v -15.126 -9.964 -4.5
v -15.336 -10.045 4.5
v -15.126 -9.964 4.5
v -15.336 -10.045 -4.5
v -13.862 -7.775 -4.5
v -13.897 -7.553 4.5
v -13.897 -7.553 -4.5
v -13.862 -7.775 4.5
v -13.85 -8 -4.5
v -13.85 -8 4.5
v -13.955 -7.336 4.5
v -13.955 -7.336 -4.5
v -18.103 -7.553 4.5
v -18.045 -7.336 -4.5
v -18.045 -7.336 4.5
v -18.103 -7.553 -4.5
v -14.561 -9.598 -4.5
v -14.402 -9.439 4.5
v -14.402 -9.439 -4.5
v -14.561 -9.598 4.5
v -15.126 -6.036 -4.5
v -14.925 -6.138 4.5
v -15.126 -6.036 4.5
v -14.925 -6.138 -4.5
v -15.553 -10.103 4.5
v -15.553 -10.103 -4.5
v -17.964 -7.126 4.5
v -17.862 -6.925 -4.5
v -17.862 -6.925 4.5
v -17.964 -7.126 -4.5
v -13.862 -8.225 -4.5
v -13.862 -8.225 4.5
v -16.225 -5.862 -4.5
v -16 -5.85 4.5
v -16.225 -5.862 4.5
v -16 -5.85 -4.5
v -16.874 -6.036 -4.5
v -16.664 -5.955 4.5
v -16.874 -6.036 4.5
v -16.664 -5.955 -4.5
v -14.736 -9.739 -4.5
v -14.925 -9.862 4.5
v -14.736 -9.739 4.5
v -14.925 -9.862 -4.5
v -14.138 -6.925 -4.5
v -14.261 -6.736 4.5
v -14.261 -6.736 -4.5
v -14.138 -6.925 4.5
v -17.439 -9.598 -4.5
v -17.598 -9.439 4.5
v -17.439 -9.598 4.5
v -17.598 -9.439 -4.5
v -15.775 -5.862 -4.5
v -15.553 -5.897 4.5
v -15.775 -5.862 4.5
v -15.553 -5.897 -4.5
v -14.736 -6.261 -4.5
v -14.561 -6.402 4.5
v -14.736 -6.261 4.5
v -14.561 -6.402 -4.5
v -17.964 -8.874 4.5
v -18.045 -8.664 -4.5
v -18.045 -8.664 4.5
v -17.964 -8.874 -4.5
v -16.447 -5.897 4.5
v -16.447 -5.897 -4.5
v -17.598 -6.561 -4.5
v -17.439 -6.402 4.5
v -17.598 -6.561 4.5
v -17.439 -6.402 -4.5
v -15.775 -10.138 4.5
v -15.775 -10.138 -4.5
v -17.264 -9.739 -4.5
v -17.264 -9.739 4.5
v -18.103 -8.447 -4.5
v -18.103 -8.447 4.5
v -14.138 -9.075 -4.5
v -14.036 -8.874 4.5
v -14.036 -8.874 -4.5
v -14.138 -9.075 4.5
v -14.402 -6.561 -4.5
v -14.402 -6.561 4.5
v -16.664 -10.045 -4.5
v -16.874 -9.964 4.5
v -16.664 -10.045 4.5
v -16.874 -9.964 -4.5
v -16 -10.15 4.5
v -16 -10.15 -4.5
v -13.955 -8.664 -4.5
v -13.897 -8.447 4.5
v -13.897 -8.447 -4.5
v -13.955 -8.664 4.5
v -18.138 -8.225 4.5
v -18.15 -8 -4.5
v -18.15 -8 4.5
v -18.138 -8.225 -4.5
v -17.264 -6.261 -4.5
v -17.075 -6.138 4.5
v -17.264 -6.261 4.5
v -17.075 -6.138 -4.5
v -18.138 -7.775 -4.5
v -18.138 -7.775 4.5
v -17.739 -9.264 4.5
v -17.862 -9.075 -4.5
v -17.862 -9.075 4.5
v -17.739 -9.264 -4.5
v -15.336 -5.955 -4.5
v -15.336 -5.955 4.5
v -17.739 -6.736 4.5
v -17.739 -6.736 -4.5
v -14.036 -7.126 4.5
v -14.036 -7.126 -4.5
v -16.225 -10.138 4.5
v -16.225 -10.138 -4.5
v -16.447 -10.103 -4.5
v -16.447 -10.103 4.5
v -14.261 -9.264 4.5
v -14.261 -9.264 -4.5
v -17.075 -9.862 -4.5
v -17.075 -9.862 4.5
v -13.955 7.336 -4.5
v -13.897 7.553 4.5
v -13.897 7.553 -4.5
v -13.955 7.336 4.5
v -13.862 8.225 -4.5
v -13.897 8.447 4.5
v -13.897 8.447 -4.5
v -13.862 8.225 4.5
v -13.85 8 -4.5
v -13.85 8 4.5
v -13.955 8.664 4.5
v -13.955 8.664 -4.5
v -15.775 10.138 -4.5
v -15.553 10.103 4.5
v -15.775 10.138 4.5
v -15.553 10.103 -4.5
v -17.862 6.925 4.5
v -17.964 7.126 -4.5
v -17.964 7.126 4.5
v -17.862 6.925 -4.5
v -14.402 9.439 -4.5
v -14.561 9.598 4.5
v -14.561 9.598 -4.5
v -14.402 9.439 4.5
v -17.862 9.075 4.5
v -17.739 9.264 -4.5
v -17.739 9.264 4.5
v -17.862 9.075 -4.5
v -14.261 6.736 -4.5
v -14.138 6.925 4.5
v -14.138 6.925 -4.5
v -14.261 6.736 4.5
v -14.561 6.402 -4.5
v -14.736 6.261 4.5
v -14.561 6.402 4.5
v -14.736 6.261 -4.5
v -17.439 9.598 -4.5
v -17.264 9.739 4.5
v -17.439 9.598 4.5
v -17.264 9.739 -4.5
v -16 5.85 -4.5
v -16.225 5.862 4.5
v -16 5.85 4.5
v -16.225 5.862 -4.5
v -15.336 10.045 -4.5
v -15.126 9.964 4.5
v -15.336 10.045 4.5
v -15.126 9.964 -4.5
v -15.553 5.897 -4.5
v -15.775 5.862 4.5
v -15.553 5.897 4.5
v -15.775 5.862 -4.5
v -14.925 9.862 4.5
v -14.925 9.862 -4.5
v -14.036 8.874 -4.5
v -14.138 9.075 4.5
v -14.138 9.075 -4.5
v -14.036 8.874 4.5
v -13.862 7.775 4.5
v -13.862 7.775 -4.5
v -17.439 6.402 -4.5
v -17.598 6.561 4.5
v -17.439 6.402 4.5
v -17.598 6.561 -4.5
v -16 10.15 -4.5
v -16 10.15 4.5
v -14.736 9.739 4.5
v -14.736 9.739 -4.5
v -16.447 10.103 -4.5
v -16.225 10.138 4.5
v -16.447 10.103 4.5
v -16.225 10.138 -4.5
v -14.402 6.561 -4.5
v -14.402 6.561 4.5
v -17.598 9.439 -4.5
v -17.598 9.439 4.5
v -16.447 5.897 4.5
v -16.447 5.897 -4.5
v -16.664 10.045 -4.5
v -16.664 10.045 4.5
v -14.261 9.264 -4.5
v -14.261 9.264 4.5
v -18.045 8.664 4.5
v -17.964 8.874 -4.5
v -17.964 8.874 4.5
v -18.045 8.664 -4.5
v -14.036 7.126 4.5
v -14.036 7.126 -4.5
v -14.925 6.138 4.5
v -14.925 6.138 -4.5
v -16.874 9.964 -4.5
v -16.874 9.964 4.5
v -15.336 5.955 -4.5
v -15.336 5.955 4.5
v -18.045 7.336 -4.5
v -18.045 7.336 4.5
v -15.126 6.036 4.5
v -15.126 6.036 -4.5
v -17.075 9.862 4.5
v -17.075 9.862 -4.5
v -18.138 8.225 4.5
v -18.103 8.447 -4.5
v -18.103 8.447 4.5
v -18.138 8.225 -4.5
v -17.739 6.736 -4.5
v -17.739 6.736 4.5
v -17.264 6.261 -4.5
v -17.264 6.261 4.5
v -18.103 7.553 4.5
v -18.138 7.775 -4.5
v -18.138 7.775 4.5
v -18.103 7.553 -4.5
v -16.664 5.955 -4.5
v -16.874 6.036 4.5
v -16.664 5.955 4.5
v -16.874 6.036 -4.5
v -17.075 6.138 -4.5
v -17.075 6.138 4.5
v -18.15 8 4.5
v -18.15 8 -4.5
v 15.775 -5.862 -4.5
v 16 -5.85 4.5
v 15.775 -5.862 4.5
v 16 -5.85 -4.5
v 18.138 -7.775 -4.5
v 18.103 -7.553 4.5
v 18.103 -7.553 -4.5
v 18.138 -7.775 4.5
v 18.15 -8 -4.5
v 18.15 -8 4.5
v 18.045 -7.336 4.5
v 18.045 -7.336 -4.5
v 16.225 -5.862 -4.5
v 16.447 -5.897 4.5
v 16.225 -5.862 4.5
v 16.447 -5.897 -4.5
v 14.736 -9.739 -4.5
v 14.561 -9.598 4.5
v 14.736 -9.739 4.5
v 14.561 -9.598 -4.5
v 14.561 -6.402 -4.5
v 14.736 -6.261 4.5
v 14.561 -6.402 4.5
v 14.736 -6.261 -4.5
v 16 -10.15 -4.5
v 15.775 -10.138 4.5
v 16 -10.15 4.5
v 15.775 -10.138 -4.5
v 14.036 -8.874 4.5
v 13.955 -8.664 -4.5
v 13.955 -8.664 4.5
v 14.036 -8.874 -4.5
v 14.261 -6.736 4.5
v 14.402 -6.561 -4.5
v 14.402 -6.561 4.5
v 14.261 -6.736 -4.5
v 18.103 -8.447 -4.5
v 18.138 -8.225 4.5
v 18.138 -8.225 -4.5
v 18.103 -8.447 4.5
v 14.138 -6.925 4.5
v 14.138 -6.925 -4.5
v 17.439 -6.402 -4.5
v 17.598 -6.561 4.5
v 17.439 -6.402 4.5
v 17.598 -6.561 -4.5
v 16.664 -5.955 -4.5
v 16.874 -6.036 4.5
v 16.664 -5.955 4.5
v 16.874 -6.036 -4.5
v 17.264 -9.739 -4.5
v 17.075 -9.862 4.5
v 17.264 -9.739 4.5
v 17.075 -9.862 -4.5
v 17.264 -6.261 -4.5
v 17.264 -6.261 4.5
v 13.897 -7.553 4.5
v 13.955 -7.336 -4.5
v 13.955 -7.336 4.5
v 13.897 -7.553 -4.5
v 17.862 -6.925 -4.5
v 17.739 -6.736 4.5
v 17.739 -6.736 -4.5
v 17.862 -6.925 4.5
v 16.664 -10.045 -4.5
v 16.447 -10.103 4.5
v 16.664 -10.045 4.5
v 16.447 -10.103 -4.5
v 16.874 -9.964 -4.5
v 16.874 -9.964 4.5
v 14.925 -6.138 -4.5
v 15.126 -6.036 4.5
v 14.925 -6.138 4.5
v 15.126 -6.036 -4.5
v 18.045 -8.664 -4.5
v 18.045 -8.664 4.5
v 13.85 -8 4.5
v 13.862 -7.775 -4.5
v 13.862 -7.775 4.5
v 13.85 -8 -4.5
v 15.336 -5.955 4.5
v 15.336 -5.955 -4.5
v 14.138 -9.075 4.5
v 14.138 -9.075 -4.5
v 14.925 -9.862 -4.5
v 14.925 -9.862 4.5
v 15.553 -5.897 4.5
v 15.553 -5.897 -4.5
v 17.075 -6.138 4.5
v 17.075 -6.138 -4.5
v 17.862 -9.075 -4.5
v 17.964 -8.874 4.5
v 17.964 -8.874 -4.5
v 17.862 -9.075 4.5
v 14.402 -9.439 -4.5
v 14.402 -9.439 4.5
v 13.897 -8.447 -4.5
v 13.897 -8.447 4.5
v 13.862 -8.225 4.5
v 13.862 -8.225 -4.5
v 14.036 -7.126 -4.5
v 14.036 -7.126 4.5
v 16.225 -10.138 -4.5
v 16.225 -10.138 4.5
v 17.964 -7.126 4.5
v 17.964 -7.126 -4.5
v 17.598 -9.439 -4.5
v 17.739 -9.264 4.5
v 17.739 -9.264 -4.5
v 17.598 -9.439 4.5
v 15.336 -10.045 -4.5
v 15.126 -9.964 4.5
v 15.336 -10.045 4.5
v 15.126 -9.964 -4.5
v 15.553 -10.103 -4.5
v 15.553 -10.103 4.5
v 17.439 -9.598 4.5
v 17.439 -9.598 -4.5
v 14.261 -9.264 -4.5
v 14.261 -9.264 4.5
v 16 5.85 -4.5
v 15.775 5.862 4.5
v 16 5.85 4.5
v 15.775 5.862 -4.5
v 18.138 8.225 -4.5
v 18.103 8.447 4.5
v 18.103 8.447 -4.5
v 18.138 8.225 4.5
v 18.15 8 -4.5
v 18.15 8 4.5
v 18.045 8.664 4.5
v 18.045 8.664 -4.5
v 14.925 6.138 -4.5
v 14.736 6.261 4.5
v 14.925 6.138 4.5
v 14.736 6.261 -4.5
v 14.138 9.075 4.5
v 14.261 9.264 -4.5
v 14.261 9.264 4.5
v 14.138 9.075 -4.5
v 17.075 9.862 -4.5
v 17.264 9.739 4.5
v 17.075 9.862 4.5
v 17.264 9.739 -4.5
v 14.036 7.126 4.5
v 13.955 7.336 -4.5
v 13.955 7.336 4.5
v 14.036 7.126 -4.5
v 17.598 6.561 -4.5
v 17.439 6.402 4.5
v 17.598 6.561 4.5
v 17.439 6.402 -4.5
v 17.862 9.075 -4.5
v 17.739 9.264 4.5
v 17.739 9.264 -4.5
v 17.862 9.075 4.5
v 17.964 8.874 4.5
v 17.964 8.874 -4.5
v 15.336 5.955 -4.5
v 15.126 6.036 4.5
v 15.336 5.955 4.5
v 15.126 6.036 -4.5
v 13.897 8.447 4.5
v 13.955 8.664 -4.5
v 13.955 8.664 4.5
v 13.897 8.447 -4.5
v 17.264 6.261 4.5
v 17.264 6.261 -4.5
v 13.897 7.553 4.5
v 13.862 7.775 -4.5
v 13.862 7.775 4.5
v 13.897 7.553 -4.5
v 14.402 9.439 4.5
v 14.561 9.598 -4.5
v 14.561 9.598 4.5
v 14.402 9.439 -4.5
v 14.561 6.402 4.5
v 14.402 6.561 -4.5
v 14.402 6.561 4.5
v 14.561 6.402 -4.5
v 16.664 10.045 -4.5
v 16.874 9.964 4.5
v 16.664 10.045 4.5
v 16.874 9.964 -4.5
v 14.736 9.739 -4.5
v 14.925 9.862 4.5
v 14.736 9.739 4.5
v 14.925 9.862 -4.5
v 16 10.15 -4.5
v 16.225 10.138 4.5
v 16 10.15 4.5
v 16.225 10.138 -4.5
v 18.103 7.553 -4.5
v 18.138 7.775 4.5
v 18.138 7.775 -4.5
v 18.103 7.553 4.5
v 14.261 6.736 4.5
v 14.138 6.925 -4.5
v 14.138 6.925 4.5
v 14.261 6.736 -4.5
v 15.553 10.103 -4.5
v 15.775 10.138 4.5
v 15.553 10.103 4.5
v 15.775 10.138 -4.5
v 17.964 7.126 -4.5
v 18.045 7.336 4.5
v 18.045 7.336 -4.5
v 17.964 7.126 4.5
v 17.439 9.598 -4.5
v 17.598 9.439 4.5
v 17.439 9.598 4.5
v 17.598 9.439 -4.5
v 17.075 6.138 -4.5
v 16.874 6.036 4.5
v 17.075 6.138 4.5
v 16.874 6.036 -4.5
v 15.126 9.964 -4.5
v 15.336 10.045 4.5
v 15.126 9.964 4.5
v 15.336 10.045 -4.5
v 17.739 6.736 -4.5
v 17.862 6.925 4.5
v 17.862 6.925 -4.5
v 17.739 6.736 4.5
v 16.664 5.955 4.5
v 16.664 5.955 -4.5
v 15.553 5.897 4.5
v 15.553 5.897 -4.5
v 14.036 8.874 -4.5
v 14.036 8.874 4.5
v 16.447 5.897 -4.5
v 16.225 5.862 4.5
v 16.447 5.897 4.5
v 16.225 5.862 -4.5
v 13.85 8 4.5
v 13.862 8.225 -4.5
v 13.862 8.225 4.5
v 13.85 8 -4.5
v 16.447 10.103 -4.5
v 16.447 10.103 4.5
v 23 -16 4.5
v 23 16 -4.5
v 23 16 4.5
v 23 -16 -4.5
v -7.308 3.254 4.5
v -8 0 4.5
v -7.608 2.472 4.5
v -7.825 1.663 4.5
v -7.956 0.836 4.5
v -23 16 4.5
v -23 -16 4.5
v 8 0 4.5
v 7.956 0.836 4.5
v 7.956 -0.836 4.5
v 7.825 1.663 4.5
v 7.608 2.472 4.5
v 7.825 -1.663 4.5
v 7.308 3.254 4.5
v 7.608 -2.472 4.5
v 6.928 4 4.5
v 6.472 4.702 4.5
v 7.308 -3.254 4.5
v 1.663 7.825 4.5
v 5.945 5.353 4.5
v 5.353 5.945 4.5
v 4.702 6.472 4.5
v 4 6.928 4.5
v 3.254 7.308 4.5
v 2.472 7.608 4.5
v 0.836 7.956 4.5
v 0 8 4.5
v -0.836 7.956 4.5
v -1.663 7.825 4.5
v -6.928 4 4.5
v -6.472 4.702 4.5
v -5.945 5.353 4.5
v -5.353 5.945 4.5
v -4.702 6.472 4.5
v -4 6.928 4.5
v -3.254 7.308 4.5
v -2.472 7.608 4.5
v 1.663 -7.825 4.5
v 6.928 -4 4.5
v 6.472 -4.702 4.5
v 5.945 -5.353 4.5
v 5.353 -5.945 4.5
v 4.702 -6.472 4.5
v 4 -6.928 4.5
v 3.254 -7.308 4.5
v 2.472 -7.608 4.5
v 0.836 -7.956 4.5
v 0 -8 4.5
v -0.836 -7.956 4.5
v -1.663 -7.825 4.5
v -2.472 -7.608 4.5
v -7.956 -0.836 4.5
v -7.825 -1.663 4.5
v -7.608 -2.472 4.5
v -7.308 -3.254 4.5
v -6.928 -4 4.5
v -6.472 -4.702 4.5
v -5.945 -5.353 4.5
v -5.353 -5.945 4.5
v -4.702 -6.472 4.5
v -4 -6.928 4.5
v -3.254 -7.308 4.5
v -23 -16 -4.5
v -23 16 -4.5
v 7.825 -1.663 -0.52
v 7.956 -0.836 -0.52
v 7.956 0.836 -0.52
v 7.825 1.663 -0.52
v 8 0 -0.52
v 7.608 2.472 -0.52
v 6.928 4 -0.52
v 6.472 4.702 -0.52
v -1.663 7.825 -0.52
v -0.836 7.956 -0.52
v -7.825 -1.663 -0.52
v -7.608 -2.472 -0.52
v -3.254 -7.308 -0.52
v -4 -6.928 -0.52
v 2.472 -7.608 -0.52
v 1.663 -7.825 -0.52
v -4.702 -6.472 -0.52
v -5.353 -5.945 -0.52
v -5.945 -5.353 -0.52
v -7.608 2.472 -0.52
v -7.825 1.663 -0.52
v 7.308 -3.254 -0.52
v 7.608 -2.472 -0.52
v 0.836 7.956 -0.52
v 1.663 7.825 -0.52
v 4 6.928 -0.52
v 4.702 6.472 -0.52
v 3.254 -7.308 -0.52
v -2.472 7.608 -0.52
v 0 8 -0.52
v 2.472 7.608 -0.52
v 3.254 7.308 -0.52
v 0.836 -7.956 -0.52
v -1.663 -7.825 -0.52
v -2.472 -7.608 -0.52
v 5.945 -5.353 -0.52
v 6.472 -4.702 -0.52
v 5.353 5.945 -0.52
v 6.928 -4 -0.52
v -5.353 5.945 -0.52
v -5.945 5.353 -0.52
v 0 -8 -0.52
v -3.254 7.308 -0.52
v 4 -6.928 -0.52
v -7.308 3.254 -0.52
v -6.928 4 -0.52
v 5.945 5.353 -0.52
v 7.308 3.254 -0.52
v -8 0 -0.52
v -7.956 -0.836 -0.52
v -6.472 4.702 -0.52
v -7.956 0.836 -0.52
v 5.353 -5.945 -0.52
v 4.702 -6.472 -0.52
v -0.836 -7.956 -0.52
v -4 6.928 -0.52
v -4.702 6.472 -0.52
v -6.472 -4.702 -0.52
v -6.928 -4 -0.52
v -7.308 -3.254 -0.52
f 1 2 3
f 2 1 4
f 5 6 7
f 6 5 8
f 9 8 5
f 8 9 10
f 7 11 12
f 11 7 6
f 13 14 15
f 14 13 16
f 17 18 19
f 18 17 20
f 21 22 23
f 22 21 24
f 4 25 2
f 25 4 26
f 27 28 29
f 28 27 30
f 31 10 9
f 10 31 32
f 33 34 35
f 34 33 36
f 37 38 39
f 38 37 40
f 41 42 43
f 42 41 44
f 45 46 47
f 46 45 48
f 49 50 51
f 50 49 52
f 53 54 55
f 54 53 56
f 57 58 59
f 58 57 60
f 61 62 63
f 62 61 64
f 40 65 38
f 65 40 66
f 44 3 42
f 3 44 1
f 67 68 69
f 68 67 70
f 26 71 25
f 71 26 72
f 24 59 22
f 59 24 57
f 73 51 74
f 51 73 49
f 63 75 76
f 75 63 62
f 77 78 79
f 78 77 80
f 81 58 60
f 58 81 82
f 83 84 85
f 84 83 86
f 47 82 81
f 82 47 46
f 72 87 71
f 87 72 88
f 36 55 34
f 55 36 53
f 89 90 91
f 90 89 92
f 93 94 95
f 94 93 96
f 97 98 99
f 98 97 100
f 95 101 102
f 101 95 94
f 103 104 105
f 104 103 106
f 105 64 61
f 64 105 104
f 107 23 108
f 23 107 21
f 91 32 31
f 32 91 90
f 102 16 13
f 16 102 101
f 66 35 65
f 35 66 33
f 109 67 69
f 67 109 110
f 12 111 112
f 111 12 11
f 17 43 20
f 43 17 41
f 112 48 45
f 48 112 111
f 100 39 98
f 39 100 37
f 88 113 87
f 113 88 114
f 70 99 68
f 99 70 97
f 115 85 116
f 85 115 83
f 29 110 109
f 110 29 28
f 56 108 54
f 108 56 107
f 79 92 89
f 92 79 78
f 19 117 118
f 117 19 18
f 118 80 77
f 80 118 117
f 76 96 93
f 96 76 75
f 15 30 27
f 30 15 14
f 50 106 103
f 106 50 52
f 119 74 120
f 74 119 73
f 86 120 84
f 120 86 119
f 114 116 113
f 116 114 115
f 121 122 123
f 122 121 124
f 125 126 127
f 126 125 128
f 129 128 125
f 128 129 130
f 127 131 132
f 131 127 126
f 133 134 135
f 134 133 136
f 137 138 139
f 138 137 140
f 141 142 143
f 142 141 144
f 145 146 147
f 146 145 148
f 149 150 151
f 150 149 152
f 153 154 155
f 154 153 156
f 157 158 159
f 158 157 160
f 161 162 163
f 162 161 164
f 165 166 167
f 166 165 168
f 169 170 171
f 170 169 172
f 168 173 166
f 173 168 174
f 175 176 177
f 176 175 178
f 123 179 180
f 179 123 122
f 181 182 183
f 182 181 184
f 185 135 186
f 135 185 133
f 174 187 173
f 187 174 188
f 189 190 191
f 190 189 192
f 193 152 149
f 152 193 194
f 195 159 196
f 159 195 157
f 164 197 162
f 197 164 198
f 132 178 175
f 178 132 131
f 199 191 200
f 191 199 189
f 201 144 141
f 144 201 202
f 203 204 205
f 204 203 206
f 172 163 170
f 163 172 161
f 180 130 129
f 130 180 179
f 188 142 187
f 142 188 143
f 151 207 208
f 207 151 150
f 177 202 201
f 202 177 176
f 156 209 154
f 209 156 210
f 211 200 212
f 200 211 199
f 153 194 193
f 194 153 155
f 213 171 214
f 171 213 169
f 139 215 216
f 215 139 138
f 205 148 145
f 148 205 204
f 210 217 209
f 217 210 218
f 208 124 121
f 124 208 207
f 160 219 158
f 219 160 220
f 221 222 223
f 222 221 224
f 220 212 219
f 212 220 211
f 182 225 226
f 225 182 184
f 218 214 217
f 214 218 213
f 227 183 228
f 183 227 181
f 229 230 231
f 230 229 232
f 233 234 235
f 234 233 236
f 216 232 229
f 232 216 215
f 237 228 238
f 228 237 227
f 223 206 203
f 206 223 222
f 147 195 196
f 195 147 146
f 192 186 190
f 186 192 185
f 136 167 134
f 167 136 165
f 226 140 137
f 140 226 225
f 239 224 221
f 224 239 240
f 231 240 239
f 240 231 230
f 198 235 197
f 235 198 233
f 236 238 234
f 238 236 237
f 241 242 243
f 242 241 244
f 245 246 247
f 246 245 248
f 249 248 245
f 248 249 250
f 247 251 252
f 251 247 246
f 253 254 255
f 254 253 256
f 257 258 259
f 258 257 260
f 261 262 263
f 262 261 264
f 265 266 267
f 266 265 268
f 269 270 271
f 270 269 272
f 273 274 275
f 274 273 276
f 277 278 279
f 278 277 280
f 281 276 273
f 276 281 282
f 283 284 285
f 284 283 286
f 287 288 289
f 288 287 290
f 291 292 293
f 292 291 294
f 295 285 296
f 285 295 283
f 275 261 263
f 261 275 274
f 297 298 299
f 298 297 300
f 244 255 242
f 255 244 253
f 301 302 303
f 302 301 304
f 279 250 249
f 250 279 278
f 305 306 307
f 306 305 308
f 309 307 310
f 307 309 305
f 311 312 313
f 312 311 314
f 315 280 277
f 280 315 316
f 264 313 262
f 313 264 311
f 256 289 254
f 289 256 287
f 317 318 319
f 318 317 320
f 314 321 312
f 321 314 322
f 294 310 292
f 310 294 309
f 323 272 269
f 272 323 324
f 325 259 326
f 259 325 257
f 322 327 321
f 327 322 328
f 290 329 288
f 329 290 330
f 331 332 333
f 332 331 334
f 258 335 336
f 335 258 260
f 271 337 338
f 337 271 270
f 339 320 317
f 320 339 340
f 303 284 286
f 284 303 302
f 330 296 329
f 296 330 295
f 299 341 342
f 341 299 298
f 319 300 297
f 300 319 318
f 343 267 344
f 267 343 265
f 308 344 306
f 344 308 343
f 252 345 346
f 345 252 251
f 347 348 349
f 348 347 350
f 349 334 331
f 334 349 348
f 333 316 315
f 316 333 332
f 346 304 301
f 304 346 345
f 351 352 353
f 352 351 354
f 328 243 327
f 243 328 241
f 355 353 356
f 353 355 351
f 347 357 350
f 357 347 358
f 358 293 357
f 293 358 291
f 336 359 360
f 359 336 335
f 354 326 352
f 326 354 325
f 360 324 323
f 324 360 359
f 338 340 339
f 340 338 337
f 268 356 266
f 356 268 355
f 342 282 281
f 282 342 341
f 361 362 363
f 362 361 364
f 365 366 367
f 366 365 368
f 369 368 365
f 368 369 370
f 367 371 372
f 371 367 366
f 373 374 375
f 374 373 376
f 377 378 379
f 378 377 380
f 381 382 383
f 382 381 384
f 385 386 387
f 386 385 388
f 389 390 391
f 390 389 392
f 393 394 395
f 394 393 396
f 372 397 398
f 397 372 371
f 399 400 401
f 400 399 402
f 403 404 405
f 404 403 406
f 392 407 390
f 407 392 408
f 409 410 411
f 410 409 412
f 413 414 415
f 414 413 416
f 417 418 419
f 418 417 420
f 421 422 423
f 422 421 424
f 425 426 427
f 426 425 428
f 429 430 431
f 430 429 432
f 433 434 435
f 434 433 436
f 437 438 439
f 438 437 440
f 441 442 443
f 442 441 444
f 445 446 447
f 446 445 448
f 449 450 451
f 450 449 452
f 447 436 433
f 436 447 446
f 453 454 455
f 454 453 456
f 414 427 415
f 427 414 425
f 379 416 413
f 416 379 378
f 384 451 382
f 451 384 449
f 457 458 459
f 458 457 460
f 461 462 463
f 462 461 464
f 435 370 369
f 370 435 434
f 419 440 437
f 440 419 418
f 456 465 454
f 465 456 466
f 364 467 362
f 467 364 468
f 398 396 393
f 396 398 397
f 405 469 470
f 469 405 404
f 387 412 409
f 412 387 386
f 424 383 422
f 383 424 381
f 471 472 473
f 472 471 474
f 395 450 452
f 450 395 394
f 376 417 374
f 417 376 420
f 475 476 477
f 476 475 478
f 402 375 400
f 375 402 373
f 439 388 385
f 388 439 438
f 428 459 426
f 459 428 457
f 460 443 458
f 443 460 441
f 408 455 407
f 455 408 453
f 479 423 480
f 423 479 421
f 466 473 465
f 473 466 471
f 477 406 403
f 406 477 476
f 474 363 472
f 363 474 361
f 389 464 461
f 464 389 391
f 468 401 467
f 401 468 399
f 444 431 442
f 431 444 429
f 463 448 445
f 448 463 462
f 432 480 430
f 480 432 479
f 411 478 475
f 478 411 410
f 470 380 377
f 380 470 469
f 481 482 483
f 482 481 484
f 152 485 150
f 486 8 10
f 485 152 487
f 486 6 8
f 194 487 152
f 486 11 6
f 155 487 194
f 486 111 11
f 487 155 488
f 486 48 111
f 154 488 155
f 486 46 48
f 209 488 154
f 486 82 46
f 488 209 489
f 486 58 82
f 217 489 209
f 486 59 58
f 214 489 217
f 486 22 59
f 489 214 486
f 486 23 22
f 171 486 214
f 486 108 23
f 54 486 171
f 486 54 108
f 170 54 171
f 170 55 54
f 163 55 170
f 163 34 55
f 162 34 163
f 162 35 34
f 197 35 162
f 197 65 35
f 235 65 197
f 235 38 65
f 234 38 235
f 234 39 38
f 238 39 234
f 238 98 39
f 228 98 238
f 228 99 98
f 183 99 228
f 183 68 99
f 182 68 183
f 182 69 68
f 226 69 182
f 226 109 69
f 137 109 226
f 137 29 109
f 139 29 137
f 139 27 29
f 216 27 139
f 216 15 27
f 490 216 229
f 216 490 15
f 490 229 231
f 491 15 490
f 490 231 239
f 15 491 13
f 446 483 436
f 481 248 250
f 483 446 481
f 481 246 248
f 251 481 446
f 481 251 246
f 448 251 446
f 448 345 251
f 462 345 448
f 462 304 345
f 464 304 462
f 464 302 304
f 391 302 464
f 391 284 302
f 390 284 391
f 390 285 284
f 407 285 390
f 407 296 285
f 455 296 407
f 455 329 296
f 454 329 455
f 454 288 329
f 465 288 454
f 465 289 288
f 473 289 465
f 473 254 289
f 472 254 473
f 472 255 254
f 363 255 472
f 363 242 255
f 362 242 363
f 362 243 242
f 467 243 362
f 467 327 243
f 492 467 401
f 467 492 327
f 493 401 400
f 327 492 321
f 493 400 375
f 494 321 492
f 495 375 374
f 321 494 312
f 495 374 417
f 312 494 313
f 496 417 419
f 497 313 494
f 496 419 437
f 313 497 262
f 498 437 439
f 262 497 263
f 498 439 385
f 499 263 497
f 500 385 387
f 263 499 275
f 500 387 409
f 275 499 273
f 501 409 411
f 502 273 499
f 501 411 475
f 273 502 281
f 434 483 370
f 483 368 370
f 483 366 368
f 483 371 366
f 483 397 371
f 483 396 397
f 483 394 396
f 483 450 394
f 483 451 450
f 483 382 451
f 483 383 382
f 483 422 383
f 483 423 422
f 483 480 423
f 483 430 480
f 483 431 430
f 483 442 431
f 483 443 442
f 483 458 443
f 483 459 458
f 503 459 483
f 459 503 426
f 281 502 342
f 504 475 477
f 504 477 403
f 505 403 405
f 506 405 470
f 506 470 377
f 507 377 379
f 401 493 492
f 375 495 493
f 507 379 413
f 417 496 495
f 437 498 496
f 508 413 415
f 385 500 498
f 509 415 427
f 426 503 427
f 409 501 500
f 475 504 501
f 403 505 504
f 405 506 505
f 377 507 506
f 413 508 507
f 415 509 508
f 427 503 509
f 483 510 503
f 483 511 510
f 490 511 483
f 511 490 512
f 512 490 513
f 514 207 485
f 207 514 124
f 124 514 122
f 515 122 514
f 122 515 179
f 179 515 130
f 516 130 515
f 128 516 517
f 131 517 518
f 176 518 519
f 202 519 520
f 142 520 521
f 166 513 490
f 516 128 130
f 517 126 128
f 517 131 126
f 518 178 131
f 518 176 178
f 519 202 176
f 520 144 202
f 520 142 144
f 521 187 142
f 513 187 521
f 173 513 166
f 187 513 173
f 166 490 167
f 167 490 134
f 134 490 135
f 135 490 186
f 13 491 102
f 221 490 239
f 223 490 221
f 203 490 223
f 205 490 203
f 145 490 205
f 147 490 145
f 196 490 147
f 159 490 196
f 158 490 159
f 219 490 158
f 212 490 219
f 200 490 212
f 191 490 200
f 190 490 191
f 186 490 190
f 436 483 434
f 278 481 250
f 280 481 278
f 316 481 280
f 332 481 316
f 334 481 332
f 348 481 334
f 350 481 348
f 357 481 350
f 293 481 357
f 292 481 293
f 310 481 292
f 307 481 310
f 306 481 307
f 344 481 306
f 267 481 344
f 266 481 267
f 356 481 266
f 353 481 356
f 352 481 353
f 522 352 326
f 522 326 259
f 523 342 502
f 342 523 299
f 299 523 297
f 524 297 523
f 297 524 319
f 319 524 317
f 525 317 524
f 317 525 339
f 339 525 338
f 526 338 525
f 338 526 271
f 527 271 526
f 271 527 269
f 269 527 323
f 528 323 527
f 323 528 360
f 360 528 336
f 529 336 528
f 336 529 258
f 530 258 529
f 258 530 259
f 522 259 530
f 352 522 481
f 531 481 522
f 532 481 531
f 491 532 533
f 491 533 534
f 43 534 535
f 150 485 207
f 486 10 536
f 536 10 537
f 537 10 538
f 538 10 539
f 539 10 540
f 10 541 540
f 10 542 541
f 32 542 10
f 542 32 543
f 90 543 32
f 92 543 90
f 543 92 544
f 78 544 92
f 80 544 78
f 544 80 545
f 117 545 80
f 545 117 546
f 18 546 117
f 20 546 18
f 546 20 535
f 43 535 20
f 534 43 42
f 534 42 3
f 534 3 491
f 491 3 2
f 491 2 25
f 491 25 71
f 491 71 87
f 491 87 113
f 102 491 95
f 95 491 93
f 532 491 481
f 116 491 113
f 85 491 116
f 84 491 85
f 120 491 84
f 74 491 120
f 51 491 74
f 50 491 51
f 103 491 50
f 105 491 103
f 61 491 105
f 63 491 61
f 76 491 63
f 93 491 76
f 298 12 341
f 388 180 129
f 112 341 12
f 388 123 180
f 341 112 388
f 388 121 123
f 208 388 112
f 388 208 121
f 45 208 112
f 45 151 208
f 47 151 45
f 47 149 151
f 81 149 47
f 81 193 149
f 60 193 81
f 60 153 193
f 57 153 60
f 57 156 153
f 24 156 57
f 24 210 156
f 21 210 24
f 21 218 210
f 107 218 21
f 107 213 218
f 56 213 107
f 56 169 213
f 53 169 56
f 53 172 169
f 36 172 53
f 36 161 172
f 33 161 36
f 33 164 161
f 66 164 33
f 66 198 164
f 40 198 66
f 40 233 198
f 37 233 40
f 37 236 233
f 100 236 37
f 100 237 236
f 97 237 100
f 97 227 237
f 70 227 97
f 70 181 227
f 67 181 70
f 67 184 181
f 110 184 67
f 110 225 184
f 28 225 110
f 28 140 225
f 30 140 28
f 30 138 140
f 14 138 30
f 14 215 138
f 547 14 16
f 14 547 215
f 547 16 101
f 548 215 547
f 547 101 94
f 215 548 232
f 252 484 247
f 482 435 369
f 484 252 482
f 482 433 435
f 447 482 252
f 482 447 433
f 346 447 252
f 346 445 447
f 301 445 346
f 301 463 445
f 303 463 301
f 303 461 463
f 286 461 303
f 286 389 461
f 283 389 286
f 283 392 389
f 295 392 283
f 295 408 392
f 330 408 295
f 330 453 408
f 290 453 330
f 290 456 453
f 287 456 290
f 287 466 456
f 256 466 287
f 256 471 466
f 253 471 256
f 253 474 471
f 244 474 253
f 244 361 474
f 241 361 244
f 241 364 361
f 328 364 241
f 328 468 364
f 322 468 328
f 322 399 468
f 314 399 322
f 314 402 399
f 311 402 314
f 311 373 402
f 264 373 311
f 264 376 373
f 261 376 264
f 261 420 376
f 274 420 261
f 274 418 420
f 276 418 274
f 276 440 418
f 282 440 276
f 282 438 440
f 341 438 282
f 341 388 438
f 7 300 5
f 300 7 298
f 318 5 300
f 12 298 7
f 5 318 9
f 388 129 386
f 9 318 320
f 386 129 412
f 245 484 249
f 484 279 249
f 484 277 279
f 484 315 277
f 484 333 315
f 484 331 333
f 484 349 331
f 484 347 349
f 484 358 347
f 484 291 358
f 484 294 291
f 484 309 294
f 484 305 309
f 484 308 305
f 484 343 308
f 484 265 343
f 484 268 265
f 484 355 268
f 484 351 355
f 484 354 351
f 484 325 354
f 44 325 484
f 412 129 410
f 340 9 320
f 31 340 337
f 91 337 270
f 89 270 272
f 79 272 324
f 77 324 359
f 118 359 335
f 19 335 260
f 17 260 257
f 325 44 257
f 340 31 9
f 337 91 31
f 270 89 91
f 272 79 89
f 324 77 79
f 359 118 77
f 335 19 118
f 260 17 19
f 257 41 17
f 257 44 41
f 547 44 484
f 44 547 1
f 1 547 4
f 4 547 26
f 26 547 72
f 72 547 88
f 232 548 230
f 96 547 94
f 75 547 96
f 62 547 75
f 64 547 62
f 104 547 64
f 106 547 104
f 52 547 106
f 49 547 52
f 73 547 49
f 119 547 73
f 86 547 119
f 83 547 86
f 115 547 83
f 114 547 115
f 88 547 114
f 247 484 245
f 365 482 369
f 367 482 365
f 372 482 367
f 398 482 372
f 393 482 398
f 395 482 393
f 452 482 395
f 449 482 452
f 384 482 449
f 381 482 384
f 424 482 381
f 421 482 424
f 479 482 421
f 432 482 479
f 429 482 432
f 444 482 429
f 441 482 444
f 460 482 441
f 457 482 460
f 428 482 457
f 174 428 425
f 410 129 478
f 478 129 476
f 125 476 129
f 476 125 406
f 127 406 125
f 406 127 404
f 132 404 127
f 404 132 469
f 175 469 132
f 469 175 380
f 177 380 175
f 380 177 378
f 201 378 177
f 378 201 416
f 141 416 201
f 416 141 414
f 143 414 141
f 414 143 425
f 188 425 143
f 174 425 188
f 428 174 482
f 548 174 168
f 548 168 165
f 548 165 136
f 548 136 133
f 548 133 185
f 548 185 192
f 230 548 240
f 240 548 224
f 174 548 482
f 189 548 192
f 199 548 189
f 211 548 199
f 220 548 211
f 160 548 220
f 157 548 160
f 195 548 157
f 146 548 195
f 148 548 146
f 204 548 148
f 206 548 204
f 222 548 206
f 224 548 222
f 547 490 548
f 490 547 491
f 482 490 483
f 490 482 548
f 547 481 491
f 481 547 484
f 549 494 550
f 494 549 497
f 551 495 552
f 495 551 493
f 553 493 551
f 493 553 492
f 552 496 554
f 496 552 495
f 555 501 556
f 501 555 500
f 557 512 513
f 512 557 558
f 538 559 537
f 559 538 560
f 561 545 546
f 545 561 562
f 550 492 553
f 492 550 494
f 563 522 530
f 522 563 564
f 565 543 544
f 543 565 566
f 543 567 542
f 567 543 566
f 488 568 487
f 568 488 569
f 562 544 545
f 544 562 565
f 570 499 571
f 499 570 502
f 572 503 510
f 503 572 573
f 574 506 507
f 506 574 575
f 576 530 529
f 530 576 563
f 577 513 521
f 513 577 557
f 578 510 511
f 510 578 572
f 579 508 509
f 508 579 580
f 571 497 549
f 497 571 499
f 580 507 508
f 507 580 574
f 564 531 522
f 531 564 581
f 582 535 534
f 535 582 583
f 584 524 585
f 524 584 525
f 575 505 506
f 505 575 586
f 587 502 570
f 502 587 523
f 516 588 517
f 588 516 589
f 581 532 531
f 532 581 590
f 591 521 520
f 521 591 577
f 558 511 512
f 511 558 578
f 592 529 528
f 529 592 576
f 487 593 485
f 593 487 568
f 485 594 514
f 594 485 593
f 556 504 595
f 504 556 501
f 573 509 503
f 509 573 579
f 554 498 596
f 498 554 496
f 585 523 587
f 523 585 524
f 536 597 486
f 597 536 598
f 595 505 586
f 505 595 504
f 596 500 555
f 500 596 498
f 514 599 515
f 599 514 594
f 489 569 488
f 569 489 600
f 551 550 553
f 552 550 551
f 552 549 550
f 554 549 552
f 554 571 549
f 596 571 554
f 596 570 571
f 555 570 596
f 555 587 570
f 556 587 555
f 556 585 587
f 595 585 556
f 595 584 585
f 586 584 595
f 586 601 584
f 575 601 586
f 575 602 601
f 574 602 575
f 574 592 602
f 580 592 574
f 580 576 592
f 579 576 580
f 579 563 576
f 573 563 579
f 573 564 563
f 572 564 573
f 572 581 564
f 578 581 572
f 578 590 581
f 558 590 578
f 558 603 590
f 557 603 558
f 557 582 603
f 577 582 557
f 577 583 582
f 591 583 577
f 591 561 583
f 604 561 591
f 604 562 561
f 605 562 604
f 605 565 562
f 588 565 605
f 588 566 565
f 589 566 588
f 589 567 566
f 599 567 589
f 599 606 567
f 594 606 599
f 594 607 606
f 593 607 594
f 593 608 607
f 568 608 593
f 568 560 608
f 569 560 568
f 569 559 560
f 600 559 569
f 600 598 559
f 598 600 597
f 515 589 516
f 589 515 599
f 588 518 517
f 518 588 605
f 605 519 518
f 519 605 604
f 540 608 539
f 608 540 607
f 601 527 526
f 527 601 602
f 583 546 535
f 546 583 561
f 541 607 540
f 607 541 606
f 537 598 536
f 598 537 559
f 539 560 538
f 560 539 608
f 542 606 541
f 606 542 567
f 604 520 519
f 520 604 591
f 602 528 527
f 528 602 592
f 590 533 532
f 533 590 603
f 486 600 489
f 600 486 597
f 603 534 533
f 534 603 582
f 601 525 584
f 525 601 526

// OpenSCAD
// Lead-screw nut holder with 16 mm pocket.
$fn = 60;
eps = 0.02;
body_l = 46;
body_w = 32;
body_t = 9;
pocket_d = 16;
pocket_depth = 5;
mount_x = 16.0;
difference() {
    cube([body_l, body_w, body_t], center = true);
    translate([0, 0, body_t / 2 - pocket_depth - eps]) cylinder(d = pocket_d, h = pocket_depth + 2 * eps);
    for (x = [-mount_x, mount_x], y = [-body_w / 4, body_w / 4])
        translate([x, y, -body_t / 2 - eps]) cylinder(d = 4.3, h = body_t + 2 * eps);
}
